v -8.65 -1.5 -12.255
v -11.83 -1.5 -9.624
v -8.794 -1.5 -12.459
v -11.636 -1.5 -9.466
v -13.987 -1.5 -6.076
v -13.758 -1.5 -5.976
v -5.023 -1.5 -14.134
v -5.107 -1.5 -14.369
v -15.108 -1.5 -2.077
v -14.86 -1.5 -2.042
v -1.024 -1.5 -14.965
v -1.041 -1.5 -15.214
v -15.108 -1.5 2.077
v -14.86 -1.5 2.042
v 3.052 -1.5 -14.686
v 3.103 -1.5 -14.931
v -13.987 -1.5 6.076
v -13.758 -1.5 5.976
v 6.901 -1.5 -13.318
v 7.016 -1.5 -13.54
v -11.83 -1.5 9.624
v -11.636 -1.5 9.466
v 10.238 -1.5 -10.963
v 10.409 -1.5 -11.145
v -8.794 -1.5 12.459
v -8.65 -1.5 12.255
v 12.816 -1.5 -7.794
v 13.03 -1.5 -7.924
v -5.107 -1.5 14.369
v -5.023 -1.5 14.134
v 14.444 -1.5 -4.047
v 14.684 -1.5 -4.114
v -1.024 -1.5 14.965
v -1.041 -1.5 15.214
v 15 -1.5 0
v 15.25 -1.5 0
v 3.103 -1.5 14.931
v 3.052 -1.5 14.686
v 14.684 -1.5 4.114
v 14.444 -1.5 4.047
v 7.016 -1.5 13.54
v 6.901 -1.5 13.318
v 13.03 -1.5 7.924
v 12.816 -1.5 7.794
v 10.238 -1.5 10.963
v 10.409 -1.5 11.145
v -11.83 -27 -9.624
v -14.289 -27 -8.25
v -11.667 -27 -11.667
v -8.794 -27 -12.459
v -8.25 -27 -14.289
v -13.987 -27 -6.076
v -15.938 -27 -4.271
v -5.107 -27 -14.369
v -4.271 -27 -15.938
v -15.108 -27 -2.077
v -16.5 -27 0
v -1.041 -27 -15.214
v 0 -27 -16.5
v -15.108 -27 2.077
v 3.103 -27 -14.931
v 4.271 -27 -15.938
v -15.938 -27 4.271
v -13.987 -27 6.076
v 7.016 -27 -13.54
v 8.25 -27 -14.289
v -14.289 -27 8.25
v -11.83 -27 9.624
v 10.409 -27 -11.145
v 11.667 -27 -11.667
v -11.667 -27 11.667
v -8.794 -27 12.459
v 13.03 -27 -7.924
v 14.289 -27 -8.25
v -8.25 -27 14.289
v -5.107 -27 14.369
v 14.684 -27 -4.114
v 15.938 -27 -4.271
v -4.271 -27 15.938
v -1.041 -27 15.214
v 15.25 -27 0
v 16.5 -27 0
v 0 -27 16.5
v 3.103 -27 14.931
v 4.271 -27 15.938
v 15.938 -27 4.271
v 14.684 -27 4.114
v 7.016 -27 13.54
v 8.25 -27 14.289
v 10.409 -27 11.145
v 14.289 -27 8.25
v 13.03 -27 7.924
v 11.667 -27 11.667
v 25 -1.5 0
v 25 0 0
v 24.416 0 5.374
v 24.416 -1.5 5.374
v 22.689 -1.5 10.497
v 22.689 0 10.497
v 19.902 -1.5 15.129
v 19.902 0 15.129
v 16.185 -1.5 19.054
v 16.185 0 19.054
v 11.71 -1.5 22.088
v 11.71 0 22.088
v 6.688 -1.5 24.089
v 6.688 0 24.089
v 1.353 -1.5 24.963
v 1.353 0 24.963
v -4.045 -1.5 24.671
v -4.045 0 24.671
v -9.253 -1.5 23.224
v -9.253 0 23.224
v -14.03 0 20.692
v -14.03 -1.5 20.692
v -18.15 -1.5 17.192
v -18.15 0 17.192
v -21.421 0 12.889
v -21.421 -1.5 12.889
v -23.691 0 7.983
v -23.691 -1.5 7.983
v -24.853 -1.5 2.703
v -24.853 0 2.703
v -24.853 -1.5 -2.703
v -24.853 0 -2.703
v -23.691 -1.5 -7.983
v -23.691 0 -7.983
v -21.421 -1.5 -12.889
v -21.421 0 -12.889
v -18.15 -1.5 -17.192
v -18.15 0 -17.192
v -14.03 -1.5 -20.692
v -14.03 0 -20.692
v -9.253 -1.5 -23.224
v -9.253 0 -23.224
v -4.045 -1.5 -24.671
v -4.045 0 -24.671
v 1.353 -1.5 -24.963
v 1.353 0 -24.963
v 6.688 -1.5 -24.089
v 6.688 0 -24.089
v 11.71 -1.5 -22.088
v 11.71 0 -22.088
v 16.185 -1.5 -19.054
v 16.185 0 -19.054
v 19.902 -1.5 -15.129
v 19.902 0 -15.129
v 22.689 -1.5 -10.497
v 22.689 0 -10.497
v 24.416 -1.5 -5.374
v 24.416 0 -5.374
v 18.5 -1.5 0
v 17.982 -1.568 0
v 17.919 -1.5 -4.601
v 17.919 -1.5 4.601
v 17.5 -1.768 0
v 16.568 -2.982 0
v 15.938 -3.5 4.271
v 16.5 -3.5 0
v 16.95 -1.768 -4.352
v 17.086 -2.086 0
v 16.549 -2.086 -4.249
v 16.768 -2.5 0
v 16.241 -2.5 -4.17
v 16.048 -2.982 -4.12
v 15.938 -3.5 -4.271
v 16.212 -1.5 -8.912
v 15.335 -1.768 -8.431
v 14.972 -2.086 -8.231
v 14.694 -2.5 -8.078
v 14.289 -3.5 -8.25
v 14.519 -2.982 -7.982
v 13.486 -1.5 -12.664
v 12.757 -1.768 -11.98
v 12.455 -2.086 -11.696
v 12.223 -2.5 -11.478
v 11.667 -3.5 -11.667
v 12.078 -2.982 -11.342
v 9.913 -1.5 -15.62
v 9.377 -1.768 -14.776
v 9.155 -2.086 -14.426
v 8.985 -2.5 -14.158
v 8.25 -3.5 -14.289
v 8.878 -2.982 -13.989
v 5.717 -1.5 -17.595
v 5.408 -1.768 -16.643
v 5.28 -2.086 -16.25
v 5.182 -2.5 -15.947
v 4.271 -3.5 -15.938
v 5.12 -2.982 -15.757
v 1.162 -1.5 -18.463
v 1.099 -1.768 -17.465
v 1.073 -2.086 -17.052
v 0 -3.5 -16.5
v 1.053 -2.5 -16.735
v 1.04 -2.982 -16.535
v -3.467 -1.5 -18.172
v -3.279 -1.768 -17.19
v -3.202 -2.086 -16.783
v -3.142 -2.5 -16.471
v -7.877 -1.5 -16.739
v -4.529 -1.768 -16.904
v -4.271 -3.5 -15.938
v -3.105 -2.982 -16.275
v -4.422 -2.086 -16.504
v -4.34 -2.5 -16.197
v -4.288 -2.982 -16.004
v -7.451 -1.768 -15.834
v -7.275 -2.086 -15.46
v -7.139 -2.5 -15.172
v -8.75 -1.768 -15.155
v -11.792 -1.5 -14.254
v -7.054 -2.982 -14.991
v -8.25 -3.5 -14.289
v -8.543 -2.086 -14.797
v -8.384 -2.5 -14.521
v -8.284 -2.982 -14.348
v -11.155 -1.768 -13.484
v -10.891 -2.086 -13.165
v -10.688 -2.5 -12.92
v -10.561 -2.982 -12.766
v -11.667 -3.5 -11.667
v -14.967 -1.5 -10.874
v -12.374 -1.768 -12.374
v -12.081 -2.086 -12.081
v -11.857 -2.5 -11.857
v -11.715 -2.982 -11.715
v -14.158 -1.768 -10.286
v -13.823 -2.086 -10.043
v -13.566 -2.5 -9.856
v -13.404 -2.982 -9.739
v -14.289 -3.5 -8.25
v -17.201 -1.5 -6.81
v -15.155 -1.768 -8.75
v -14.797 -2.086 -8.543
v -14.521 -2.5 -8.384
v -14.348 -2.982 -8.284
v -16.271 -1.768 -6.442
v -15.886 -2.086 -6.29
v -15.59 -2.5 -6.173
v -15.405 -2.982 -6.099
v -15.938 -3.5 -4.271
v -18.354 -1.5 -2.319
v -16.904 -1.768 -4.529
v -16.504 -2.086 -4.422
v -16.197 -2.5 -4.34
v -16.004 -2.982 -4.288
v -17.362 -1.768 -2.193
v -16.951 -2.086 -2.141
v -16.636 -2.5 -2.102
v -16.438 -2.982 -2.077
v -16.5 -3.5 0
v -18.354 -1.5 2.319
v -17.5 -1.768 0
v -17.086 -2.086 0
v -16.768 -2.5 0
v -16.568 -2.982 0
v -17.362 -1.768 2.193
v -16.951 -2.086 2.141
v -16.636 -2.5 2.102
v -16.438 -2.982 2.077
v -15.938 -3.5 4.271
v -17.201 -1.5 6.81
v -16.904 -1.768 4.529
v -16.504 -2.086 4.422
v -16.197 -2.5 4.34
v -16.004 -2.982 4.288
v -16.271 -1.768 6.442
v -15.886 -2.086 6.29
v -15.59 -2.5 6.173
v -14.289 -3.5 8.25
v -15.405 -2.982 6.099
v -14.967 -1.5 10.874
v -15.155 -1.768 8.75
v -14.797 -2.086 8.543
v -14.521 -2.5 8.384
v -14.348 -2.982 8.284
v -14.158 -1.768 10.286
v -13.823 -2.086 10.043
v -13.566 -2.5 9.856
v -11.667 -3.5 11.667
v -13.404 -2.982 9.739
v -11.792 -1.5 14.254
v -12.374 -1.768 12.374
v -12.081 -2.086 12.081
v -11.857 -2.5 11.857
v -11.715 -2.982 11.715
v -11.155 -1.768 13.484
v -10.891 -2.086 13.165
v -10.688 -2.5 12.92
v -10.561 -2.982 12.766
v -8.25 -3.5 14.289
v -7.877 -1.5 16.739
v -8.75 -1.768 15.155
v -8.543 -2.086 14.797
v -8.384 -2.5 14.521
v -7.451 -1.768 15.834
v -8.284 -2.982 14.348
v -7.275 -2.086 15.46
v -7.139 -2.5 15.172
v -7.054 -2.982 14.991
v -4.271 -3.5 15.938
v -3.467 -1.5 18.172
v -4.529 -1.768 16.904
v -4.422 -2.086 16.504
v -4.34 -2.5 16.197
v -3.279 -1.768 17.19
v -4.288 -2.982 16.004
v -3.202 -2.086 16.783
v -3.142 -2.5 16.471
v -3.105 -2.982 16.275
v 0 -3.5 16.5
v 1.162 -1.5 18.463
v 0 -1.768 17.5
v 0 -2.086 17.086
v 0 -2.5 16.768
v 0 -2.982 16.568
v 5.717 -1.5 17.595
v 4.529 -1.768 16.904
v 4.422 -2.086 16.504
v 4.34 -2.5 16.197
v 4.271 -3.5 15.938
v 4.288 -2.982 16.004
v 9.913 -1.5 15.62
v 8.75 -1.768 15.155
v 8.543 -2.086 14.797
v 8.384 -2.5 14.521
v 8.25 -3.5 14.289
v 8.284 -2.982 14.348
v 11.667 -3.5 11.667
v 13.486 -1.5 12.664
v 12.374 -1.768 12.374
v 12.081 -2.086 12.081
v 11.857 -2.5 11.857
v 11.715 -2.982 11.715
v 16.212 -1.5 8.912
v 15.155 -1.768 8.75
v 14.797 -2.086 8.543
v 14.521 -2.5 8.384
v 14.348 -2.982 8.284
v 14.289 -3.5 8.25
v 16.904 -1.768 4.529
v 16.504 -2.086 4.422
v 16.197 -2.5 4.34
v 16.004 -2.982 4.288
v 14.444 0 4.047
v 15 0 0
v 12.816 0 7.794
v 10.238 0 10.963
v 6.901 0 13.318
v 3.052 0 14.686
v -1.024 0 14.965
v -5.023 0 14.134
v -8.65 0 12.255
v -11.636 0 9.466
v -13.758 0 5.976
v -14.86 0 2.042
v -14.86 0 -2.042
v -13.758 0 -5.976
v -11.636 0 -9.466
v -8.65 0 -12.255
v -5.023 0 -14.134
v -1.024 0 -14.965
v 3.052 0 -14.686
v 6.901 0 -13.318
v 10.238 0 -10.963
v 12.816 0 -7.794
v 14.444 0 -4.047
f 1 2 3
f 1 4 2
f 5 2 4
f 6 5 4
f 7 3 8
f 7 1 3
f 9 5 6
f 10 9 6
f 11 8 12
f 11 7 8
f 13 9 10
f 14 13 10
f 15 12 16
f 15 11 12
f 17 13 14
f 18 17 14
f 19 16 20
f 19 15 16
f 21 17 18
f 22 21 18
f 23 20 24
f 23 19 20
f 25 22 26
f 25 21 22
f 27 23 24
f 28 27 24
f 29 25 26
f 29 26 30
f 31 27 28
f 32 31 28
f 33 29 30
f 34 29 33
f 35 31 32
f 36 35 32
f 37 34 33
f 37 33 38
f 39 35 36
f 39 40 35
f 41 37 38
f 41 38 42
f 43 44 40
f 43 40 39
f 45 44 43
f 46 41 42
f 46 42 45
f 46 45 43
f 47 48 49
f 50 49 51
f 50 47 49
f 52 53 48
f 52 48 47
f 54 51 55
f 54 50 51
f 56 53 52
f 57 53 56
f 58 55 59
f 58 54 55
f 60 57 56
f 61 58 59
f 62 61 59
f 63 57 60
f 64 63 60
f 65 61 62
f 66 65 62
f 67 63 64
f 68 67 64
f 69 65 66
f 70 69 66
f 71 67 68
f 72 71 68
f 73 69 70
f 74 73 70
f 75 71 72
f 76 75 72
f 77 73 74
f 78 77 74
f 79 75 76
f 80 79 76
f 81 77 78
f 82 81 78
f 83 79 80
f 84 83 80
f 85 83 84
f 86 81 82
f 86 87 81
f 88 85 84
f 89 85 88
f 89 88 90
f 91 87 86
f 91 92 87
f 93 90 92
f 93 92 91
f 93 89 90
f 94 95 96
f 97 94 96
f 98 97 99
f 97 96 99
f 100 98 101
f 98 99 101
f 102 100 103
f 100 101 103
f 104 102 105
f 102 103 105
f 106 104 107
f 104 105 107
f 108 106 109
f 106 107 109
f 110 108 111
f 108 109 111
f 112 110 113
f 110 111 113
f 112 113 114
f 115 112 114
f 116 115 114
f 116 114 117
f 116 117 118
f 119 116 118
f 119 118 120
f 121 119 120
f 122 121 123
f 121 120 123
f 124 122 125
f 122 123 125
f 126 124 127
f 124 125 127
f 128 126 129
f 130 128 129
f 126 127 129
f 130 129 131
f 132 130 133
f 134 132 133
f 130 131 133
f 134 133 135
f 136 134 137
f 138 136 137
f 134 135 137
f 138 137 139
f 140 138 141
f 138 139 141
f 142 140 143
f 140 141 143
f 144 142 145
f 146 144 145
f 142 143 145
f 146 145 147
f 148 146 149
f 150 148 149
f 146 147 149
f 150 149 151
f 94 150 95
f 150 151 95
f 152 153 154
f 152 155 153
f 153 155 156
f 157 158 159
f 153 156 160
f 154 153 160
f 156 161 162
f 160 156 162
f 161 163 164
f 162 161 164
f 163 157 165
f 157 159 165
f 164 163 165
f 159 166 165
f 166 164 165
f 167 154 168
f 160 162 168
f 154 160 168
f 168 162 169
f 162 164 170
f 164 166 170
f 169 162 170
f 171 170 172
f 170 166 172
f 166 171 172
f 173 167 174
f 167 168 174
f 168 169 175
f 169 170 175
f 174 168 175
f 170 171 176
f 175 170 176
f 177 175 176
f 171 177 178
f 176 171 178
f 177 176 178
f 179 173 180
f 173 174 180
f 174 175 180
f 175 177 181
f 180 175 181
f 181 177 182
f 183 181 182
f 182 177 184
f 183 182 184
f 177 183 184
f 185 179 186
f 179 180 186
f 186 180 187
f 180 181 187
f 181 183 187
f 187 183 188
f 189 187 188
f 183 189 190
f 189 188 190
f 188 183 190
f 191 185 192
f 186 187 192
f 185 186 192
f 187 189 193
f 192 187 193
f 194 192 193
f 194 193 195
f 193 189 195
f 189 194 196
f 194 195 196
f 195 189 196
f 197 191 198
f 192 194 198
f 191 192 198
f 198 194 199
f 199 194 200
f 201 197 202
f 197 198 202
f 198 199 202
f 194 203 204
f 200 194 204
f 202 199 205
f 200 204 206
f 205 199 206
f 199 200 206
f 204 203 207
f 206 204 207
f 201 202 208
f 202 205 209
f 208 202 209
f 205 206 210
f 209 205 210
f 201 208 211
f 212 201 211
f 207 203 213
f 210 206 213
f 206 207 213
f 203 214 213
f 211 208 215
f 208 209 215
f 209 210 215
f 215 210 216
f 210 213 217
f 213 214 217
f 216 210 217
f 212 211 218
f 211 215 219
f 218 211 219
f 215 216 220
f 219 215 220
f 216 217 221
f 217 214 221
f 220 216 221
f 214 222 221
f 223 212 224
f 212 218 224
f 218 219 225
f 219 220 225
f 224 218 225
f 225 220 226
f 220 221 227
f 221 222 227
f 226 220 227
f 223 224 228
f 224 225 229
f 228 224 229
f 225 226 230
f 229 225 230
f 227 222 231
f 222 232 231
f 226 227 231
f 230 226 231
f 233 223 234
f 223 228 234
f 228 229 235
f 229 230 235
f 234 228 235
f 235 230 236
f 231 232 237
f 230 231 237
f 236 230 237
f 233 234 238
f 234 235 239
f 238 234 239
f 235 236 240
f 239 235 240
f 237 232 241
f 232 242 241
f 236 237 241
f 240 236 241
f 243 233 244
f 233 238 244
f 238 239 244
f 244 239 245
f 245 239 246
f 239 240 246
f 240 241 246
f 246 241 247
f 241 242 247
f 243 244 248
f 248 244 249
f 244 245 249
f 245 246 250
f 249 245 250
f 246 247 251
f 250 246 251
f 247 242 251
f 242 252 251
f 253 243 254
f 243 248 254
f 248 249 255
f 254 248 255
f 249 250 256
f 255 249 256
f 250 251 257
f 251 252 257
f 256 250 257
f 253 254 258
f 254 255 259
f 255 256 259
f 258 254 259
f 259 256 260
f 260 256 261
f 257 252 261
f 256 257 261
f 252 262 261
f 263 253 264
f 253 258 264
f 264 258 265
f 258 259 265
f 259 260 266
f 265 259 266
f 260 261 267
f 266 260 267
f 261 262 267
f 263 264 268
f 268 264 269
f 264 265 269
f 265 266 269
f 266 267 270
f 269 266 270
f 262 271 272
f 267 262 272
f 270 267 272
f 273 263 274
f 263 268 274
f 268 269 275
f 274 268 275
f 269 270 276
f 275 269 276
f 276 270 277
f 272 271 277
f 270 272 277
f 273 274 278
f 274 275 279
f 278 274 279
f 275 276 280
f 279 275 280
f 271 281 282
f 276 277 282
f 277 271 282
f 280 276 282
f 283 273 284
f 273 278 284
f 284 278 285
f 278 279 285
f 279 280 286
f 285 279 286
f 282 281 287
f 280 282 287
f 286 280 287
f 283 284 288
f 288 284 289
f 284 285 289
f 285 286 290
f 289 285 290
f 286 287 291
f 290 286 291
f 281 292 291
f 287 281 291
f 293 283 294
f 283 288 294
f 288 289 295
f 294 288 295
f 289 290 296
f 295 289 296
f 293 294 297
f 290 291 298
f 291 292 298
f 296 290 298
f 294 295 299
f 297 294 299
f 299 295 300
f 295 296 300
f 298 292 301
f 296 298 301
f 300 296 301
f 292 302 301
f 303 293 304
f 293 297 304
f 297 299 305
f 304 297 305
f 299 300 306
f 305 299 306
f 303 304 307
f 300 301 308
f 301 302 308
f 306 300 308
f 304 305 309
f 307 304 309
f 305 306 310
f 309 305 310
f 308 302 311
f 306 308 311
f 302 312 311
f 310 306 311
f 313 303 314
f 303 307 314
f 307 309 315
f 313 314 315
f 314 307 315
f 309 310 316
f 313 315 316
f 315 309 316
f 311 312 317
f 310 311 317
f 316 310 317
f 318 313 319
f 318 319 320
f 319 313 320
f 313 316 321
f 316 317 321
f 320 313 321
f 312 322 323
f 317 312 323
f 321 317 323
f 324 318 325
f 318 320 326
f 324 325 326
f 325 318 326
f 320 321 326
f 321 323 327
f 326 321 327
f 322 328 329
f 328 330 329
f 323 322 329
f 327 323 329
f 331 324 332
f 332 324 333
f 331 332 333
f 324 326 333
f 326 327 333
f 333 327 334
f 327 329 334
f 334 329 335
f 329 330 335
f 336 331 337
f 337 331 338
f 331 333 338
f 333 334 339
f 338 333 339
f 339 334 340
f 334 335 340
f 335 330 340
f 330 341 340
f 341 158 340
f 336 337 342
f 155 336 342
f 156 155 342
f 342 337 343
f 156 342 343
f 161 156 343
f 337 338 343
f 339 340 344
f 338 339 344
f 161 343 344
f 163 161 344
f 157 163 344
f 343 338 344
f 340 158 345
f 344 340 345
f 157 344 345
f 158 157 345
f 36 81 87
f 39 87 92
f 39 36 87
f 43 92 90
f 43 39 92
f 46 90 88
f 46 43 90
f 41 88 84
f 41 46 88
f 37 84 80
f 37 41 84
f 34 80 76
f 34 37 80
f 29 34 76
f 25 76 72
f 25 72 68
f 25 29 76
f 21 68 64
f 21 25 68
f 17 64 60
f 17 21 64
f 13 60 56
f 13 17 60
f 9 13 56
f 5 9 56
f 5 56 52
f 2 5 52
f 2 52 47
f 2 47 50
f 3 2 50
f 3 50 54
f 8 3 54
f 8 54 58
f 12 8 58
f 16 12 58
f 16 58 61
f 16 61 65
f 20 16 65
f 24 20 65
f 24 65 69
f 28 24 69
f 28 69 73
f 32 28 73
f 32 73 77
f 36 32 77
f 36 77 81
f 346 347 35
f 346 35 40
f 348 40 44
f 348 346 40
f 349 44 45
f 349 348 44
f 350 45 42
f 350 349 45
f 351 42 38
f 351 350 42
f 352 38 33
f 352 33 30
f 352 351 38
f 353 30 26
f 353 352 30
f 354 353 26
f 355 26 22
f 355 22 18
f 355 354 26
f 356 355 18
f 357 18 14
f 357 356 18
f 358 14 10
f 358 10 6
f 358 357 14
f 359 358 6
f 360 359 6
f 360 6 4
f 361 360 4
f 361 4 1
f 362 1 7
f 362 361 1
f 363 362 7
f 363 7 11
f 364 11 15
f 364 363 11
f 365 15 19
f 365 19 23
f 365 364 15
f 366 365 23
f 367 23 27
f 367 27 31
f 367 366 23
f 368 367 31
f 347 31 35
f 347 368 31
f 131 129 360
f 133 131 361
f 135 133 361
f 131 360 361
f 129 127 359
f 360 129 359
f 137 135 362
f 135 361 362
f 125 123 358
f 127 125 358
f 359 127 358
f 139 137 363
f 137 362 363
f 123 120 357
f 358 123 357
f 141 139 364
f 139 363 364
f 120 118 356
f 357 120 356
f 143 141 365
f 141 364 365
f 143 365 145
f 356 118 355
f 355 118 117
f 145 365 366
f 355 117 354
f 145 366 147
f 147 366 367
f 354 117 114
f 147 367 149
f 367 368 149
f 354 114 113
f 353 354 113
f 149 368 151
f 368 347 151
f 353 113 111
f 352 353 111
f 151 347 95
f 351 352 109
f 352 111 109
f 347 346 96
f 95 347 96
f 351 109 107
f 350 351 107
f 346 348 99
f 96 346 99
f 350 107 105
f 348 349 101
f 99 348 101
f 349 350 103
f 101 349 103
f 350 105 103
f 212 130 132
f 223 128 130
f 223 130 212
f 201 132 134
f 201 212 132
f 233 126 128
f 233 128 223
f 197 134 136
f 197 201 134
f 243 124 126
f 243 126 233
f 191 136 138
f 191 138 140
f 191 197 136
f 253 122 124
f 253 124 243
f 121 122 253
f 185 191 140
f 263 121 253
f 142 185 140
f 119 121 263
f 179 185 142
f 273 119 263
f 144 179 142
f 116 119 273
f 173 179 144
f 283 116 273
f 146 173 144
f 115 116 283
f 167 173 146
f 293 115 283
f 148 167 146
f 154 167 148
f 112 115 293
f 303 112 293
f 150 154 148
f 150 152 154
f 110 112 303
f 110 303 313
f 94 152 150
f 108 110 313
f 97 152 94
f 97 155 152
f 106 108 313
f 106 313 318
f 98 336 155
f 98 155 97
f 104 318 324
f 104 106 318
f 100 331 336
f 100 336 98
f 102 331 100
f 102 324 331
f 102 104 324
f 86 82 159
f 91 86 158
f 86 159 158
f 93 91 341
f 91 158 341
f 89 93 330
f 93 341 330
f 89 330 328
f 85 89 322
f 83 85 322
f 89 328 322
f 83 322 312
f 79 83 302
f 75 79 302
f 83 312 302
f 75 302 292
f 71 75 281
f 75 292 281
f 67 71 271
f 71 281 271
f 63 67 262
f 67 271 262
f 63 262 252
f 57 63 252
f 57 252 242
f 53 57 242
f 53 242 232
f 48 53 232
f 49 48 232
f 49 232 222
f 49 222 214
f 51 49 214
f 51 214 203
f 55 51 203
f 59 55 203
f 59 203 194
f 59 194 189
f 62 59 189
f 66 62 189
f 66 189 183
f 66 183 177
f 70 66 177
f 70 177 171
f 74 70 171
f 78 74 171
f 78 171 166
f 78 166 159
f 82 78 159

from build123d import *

# Parameters (mm, degrees)
F0_R     = 25
F0_R_2   = 15
F1_DEPTH = 1.5
F2_R     = 16.5
F2_R_2   = 15.25
F3_DEPTH = 27
F4_R     = 2


with BuildPart() as f1:
    # F0 (on Front) → F1 (new body)
    with BuildSketch(Plane.XZ):
        Circle(F0_R)
        Circle(F0_R_2, mode=Mode.SUBTRACT)
    extrude(amount=F1_DEPTH)

    # F2 (on Front) → F3 (join)
    with BuildSketch(Plane.XZ):
        Circle(F2_R)
        Circle(F2_R_2, mode=Mode.SUBTRACT)
    extrude(amount=F3_DEPTH)

    # F4
    f4_edges = [f1.edges().sort_by_distance(p)[0] for p in [
        (-16.5, -1.5, 0),
    ]]
    fillet(f4_edges, radius=F4_R)


solid = f1.part
